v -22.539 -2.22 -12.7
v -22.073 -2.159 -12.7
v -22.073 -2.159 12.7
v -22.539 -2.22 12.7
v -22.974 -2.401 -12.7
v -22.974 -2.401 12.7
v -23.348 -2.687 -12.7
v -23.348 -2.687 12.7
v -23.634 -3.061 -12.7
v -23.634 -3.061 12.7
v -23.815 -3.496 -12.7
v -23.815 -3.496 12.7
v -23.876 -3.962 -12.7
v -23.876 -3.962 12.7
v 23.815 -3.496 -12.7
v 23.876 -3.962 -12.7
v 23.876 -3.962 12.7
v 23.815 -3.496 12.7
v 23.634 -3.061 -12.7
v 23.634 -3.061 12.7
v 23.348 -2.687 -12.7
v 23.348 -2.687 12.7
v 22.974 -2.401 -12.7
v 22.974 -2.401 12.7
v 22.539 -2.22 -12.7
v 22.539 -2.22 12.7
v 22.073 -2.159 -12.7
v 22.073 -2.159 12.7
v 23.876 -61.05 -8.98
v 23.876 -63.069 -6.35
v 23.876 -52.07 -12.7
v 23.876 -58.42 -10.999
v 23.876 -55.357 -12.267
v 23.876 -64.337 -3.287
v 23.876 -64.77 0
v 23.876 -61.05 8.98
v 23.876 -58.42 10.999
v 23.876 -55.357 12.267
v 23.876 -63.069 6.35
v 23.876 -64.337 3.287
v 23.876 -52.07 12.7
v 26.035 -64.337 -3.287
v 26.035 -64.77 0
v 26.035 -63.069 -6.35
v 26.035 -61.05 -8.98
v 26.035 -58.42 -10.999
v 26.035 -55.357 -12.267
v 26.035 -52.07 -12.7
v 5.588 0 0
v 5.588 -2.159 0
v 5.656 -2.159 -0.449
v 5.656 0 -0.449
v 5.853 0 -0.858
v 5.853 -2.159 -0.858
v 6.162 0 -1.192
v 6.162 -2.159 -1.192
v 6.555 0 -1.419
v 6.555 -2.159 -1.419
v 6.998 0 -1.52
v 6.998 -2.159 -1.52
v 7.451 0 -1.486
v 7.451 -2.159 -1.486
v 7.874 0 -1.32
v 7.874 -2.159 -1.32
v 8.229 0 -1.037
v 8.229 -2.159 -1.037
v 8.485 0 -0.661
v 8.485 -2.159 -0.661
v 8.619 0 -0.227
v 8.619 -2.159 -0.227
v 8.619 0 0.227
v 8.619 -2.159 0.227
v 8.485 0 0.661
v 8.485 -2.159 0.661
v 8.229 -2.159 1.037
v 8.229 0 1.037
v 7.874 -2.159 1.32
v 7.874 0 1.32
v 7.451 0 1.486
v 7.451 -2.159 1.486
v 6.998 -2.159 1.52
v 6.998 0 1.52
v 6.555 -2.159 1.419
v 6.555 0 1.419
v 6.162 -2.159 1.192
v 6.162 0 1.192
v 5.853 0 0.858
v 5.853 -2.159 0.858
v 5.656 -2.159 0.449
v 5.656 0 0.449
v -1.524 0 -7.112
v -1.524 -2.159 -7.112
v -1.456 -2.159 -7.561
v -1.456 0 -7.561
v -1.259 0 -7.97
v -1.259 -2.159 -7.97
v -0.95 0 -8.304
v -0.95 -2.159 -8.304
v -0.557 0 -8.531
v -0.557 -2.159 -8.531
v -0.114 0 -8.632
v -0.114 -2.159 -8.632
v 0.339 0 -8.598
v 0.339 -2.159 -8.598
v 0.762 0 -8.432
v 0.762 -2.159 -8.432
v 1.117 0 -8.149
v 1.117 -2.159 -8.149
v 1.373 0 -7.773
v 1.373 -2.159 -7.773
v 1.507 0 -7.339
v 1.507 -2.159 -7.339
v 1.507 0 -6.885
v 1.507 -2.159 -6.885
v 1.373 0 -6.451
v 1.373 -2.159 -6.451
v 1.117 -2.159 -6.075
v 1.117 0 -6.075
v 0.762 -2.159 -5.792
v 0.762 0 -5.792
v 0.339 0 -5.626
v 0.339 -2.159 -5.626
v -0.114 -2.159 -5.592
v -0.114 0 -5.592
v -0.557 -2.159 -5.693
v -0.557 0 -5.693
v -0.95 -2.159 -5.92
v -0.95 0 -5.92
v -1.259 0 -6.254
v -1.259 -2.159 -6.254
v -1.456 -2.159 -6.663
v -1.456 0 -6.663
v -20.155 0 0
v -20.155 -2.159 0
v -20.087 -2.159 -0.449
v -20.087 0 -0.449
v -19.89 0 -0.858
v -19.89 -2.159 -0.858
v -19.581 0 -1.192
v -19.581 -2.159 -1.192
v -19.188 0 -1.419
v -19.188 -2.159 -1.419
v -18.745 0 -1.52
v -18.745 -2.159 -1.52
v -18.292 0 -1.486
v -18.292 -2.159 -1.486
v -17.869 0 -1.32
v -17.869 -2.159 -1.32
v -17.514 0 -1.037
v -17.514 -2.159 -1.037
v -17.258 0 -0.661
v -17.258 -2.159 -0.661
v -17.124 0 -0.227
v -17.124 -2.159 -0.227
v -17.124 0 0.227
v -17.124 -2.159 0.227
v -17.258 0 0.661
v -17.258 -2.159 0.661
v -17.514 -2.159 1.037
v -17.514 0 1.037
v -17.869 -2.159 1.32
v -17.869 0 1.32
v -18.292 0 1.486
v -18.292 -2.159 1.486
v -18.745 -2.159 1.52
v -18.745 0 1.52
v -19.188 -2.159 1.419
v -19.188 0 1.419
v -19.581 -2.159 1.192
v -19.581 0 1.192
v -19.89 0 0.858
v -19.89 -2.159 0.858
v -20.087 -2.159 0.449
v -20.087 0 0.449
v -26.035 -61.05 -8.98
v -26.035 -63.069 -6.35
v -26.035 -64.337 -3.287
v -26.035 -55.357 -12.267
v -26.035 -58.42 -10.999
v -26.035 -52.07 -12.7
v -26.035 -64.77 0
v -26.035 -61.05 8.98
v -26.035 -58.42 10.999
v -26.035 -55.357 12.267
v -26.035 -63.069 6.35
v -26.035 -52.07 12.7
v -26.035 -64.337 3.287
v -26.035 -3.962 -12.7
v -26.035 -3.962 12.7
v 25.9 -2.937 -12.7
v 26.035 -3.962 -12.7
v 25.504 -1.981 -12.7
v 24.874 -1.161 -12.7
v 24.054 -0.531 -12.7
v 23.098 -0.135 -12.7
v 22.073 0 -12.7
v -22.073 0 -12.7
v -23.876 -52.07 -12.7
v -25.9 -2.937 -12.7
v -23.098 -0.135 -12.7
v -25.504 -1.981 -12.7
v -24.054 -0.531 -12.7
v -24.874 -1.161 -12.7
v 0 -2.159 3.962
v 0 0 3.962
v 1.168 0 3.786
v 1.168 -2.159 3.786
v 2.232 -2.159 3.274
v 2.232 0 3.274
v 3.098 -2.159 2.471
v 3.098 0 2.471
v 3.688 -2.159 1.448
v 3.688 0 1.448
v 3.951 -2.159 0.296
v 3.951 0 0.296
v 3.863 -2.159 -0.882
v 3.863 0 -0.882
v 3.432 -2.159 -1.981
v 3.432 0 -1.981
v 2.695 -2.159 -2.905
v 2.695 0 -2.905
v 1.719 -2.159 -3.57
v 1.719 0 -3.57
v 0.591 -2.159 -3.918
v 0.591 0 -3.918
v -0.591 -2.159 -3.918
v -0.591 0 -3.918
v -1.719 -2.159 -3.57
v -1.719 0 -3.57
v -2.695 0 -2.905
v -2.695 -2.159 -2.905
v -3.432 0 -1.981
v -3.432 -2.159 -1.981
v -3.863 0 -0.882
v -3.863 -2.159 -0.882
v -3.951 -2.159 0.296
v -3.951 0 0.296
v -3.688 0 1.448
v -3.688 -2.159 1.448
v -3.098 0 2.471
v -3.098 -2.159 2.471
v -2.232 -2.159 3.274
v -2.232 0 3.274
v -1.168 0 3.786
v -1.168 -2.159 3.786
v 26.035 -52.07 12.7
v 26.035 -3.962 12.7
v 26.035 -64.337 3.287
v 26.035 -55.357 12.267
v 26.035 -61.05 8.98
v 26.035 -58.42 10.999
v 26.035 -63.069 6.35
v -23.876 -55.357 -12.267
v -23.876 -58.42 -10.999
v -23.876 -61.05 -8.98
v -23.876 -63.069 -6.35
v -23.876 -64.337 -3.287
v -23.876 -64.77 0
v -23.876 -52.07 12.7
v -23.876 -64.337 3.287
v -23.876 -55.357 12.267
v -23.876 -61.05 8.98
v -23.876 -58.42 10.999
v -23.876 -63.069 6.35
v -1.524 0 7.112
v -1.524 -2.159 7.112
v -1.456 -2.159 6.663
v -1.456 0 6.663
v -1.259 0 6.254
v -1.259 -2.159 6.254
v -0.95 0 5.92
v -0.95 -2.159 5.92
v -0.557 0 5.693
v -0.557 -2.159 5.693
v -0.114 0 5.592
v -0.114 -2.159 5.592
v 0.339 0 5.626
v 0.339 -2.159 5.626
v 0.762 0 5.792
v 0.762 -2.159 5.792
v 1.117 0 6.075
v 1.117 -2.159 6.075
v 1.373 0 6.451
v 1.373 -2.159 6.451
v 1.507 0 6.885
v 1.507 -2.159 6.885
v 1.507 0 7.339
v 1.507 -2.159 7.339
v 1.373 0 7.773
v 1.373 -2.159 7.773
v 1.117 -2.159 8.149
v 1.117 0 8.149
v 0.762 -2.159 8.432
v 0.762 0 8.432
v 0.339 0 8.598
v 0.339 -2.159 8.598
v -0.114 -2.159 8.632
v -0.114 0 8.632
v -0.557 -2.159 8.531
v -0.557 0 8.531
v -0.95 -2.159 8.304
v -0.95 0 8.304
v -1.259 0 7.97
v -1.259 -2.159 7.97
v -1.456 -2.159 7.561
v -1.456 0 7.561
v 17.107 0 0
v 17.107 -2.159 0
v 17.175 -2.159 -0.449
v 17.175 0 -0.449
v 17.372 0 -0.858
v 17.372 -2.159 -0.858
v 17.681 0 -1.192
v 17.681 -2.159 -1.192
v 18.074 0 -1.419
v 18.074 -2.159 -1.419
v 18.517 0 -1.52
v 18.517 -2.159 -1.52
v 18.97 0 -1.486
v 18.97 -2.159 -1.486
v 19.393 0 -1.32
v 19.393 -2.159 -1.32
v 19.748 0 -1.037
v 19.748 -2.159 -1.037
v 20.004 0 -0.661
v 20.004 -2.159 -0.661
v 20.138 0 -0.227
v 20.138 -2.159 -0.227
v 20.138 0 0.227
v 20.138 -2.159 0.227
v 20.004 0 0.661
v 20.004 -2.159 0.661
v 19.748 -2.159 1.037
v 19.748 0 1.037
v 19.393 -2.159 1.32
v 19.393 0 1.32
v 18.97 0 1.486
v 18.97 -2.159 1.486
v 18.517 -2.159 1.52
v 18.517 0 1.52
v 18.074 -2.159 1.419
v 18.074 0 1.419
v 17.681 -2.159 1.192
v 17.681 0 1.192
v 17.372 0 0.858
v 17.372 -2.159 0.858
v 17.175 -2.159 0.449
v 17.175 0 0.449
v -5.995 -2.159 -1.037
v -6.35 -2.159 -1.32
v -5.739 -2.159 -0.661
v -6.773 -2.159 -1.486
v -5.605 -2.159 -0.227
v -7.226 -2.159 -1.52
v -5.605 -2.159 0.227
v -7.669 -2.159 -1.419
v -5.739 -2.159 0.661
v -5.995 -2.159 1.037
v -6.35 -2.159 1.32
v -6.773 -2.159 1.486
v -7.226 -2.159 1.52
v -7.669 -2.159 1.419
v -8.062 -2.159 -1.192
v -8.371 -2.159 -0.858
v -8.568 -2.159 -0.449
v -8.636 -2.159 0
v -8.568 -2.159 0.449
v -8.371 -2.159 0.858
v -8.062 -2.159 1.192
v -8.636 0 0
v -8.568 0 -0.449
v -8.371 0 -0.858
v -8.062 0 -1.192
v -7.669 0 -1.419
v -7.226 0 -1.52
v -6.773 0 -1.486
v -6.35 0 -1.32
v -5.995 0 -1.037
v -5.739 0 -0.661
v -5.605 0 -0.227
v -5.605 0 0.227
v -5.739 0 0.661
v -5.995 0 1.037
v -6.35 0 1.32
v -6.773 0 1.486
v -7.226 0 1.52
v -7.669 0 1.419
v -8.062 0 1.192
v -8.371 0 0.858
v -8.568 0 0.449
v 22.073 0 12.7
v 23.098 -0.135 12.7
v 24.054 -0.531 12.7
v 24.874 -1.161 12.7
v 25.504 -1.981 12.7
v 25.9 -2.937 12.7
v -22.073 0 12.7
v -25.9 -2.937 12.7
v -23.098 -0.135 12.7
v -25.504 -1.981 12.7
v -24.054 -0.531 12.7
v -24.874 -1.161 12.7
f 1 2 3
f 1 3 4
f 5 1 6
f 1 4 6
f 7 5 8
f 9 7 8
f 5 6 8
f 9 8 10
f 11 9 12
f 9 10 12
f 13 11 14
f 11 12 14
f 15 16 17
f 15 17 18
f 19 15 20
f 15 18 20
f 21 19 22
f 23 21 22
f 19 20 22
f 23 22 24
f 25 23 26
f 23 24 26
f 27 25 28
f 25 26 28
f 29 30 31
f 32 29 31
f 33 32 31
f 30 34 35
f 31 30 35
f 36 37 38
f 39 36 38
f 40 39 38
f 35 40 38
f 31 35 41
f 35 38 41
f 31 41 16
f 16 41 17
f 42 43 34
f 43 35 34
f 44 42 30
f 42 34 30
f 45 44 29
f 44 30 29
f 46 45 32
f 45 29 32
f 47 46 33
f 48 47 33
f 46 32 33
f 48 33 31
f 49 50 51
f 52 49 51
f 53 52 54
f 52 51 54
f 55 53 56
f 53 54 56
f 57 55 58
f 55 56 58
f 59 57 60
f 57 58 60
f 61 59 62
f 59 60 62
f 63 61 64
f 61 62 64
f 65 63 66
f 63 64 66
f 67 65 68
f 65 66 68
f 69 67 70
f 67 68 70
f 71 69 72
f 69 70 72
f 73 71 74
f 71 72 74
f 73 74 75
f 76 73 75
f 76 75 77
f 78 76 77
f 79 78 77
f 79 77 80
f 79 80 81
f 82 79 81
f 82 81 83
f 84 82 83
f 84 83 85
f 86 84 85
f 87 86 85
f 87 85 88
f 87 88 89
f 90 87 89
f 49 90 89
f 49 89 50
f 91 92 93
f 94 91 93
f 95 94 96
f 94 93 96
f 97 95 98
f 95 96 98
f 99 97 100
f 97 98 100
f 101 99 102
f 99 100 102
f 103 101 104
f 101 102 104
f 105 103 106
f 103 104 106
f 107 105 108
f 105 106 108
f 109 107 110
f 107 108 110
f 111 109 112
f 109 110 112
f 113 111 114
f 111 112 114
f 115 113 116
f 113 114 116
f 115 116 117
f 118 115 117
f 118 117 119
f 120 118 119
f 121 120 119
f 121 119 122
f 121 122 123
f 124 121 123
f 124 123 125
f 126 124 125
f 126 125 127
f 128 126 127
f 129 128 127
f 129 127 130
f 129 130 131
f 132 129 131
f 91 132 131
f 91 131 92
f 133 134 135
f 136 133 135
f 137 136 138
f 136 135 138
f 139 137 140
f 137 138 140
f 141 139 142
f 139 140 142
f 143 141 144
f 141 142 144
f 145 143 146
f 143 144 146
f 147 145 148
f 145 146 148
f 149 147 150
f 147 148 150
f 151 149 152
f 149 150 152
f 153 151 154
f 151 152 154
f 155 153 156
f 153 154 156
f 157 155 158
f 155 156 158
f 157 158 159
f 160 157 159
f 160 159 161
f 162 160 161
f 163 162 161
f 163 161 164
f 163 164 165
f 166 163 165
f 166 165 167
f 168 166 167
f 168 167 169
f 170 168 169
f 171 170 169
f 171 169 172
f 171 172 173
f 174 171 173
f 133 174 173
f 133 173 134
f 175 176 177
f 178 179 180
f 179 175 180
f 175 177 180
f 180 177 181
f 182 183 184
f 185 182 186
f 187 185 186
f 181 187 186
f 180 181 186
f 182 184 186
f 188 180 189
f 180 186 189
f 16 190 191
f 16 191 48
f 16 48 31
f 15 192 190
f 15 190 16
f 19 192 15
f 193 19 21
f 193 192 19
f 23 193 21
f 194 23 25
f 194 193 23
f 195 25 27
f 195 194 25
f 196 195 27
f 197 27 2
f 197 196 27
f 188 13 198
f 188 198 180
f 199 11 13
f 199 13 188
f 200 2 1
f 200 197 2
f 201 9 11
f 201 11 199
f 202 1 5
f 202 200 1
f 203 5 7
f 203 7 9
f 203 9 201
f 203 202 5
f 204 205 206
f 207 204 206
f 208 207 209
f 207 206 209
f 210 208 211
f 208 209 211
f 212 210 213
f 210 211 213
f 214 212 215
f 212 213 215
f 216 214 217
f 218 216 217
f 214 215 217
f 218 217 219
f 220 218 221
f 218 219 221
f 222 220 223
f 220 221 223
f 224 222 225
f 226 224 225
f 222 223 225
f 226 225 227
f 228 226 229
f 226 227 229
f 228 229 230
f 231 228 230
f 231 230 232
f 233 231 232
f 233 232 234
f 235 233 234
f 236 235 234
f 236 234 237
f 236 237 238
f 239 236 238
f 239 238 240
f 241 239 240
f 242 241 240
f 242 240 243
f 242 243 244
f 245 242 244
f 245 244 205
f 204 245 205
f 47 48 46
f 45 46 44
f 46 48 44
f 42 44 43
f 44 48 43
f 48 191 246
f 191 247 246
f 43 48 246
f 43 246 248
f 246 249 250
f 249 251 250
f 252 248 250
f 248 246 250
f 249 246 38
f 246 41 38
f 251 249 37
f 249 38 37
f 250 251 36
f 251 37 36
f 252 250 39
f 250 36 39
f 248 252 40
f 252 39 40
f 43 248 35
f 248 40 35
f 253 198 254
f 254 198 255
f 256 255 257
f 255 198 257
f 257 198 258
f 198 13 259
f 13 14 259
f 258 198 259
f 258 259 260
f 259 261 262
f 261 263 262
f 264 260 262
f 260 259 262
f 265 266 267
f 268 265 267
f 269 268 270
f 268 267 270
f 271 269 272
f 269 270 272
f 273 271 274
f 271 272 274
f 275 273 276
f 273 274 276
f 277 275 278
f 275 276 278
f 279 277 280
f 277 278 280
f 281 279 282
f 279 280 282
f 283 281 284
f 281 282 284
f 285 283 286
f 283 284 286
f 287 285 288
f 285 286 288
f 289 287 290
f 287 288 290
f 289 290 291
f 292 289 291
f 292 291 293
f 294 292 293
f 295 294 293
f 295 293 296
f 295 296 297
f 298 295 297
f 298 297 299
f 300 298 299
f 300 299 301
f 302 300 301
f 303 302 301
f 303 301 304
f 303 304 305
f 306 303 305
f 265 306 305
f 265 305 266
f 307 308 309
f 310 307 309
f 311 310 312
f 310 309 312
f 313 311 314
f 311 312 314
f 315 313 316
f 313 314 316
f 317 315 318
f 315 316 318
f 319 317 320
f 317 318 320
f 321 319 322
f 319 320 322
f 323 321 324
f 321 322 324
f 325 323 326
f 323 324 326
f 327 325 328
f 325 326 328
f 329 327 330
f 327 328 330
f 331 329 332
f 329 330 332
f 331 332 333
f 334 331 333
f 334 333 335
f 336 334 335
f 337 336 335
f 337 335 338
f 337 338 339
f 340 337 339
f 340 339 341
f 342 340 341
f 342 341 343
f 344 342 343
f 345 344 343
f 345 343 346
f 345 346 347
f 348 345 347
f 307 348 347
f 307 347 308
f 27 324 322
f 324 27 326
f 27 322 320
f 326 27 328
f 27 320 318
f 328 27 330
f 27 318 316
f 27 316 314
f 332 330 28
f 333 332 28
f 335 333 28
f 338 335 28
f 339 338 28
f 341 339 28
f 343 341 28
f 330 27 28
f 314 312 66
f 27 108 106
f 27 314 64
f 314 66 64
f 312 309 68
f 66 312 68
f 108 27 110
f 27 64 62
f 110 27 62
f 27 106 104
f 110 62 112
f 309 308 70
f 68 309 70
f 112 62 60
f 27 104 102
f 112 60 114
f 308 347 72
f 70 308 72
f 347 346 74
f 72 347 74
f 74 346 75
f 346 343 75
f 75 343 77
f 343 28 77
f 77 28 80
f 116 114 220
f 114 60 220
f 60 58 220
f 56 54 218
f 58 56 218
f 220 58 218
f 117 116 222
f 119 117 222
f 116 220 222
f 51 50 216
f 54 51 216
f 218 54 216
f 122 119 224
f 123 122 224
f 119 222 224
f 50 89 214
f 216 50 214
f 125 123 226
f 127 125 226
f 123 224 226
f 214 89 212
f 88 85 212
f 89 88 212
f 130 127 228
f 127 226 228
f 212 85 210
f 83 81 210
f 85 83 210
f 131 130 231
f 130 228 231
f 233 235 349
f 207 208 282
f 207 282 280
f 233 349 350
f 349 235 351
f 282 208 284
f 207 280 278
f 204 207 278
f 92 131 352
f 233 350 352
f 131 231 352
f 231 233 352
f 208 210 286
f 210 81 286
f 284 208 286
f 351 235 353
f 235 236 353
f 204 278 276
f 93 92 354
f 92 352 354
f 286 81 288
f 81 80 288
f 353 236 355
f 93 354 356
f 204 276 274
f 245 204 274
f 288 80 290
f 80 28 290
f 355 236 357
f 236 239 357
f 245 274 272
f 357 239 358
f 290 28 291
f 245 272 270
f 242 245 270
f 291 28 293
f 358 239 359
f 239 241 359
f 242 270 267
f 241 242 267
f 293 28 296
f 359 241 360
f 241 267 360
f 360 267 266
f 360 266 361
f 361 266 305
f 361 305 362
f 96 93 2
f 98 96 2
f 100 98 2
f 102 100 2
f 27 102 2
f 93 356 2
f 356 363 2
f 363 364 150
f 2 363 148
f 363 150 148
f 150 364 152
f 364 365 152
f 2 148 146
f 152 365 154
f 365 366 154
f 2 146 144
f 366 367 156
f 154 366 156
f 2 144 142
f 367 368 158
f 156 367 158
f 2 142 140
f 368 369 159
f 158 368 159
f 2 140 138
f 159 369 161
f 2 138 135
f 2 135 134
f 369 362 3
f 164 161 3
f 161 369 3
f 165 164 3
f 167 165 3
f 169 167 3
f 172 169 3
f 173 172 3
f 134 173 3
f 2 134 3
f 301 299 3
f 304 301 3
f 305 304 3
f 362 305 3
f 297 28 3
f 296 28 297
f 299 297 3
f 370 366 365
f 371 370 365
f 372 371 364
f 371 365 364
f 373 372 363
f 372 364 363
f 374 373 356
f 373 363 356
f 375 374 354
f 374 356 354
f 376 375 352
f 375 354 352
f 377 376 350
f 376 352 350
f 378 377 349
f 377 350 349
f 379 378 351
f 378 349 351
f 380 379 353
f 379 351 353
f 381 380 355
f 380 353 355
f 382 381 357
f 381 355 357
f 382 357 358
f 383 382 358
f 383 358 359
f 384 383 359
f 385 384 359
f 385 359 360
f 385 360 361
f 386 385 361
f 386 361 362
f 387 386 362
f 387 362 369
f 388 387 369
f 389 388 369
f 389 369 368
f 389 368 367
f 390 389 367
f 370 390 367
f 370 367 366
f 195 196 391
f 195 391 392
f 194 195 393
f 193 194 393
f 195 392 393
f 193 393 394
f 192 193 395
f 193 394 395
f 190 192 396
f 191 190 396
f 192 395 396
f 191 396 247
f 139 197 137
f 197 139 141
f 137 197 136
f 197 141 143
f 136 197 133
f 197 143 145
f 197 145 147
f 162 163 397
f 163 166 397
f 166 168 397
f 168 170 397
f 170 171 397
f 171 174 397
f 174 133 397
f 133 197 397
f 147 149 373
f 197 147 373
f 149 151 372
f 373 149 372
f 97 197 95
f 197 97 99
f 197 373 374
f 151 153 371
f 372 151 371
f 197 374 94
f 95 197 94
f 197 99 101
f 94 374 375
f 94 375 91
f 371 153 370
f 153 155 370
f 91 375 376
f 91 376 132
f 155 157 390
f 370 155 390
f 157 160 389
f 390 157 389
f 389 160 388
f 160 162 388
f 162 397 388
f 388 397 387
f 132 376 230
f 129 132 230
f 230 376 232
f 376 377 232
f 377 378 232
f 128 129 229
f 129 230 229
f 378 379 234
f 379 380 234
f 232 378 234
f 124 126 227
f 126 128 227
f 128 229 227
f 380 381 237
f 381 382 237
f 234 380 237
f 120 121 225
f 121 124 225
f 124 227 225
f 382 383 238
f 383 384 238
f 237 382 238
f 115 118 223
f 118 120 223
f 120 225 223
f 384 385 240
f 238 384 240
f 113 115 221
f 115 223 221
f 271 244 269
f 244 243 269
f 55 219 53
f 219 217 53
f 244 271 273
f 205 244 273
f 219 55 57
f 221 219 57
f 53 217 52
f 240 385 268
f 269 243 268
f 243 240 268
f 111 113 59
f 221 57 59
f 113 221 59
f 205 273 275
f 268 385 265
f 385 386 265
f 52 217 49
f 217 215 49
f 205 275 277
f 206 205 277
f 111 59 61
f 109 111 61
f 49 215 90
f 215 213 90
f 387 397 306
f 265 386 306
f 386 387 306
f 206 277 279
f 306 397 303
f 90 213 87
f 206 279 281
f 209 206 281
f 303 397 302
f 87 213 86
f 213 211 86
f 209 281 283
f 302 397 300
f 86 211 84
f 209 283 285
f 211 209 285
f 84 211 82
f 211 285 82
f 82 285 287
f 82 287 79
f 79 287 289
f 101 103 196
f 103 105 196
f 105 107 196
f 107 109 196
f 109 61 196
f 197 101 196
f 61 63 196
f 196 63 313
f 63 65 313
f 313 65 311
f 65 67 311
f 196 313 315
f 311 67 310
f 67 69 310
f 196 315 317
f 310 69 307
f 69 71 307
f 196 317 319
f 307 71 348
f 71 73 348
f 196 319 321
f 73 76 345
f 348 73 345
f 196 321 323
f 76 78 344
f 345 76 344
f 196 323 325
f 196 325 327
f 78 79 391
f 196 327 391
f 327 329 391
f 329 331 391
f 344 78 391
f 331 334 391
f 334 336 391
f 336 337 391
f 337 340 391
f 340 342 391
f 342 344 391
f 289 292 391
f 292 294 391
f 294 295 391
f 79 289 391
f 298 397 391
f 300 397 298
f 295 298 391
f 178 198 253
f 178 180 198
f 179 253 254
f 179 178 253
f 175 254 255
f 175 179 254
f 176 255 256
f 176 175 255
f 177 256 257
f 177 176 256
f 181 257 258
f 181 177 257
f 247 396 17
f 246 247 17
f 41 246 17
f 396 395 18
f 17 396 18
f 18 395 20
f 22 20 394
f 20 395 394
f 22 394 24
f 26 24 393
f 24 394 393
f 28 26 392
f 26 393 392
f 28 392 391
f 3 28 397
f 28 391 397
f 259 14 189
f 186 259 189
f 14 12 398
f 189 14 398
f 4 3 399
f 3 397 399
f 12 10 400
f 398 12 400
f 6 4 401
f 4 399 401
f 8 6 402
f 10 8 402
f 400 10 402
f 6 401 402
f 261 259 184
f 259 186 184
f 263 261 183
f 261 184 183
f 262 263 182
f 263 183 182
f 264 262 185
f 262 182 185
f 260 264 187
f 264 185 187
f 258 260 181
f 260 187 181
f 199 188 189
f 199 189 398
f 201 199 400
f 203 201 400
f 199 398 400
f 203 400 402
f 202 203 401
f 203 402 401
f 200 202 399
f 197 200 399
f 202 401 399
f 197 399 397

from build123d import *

# Parameters (mm, degrees)
EXTRUDE_THIN1_DEPTH        = 12.7
FILLET1_R                  = 12.7
SKETCH2_R                  = 3.9624
CUT_EXTRUDE1_DEPTH         = 71.952548404
F_31_0_12_DIAMETER_HOLE1_D = 3.048


with BuildPart() as part:
    # Sketch1 → Extrude-Thin1 (new, symmetric)
    with BuildSketch(Plane.XY):
        with BuildLine():
            Line((-26.035, -64.77), (-26.035, -3.9624))
            ThreePointArc((-26.035, -3.9624), (-24.87443991, -1.16056009), (-22.0726, 0))
            Line((-22.0726, 0), (22.0726, 0))
            ThreePointArc((22.0726, 0), (24.87443991, -1.16056009), (26.035, -3.9624))
            Line((26.035, -3.9624), (26.035, -64.77))
            Line((26.035, -64.77), (23.876, -64.77))
            Line((23.876, -64.77), (23.876, -3.9624))
            ThreePointArc((23.876, -3.9624), (23.347796369, -2.687203631), (22.0726, -2.159))
            Line((22.0726, -2.159), (-22.0726, -2.159))
            ThreePointArc((-22.0726, -2.159), (-23.347796369, -2.687203631), (-23.876, -3.9624))
            Line((-23.876, -3.9624), (-23.876, -64.77))
            Line((-23.876, -64.77), (-26.035, -64.77))
        make_face()
    extrude(amount=EXTRUDE_THIN1_DEPTH, both=True)

    # Fillet1
    fillet1_edges = [part.edges().sort_by_distance(p)[0] for p in [
        (24.9555, -64.77, -12.7),
        (24.9555, -64.77, 12.7),
        (-24.9555, -64.77, -12.7),
        (-24.9555, -64.77, 12.7),
    ]]
    fillet(fillet1_edges, radius=FILLET1_R - 0.0001)  # a hair under: the kernel refuses the full size

    # Sketch2 → Cut-Extrude1 (cut, through all)
    with BuildSketch(Plane(origin=(0, 0, 0), x_dir=(1, 0, 0), z_dir=(0, 1, 0))):
        with Locations(Location((0, 0, 0), (0, 0, 270))):
            Circle(SKETCH2_R)
    extrude(amount=-CUT_EXTRUDE1_DEPTH, mode=Mode.SUBTRACT)

    # #31 (0.12) Diameter Hole1 (through all)
    with Locations(Plane(origin=(0, 0, 0), x_dir=(1, 0, 0), z_dir=(0, 1, 0))):
        with Locations((0, -7.112), (0, 7.112), (-7.112, 0), (7.112, 0), (18.6309, 0), (-18.6309, 0)):
            Hole(F_31_0_12_DIAMETER_HOLE1_D / 2)


solid = part.part
